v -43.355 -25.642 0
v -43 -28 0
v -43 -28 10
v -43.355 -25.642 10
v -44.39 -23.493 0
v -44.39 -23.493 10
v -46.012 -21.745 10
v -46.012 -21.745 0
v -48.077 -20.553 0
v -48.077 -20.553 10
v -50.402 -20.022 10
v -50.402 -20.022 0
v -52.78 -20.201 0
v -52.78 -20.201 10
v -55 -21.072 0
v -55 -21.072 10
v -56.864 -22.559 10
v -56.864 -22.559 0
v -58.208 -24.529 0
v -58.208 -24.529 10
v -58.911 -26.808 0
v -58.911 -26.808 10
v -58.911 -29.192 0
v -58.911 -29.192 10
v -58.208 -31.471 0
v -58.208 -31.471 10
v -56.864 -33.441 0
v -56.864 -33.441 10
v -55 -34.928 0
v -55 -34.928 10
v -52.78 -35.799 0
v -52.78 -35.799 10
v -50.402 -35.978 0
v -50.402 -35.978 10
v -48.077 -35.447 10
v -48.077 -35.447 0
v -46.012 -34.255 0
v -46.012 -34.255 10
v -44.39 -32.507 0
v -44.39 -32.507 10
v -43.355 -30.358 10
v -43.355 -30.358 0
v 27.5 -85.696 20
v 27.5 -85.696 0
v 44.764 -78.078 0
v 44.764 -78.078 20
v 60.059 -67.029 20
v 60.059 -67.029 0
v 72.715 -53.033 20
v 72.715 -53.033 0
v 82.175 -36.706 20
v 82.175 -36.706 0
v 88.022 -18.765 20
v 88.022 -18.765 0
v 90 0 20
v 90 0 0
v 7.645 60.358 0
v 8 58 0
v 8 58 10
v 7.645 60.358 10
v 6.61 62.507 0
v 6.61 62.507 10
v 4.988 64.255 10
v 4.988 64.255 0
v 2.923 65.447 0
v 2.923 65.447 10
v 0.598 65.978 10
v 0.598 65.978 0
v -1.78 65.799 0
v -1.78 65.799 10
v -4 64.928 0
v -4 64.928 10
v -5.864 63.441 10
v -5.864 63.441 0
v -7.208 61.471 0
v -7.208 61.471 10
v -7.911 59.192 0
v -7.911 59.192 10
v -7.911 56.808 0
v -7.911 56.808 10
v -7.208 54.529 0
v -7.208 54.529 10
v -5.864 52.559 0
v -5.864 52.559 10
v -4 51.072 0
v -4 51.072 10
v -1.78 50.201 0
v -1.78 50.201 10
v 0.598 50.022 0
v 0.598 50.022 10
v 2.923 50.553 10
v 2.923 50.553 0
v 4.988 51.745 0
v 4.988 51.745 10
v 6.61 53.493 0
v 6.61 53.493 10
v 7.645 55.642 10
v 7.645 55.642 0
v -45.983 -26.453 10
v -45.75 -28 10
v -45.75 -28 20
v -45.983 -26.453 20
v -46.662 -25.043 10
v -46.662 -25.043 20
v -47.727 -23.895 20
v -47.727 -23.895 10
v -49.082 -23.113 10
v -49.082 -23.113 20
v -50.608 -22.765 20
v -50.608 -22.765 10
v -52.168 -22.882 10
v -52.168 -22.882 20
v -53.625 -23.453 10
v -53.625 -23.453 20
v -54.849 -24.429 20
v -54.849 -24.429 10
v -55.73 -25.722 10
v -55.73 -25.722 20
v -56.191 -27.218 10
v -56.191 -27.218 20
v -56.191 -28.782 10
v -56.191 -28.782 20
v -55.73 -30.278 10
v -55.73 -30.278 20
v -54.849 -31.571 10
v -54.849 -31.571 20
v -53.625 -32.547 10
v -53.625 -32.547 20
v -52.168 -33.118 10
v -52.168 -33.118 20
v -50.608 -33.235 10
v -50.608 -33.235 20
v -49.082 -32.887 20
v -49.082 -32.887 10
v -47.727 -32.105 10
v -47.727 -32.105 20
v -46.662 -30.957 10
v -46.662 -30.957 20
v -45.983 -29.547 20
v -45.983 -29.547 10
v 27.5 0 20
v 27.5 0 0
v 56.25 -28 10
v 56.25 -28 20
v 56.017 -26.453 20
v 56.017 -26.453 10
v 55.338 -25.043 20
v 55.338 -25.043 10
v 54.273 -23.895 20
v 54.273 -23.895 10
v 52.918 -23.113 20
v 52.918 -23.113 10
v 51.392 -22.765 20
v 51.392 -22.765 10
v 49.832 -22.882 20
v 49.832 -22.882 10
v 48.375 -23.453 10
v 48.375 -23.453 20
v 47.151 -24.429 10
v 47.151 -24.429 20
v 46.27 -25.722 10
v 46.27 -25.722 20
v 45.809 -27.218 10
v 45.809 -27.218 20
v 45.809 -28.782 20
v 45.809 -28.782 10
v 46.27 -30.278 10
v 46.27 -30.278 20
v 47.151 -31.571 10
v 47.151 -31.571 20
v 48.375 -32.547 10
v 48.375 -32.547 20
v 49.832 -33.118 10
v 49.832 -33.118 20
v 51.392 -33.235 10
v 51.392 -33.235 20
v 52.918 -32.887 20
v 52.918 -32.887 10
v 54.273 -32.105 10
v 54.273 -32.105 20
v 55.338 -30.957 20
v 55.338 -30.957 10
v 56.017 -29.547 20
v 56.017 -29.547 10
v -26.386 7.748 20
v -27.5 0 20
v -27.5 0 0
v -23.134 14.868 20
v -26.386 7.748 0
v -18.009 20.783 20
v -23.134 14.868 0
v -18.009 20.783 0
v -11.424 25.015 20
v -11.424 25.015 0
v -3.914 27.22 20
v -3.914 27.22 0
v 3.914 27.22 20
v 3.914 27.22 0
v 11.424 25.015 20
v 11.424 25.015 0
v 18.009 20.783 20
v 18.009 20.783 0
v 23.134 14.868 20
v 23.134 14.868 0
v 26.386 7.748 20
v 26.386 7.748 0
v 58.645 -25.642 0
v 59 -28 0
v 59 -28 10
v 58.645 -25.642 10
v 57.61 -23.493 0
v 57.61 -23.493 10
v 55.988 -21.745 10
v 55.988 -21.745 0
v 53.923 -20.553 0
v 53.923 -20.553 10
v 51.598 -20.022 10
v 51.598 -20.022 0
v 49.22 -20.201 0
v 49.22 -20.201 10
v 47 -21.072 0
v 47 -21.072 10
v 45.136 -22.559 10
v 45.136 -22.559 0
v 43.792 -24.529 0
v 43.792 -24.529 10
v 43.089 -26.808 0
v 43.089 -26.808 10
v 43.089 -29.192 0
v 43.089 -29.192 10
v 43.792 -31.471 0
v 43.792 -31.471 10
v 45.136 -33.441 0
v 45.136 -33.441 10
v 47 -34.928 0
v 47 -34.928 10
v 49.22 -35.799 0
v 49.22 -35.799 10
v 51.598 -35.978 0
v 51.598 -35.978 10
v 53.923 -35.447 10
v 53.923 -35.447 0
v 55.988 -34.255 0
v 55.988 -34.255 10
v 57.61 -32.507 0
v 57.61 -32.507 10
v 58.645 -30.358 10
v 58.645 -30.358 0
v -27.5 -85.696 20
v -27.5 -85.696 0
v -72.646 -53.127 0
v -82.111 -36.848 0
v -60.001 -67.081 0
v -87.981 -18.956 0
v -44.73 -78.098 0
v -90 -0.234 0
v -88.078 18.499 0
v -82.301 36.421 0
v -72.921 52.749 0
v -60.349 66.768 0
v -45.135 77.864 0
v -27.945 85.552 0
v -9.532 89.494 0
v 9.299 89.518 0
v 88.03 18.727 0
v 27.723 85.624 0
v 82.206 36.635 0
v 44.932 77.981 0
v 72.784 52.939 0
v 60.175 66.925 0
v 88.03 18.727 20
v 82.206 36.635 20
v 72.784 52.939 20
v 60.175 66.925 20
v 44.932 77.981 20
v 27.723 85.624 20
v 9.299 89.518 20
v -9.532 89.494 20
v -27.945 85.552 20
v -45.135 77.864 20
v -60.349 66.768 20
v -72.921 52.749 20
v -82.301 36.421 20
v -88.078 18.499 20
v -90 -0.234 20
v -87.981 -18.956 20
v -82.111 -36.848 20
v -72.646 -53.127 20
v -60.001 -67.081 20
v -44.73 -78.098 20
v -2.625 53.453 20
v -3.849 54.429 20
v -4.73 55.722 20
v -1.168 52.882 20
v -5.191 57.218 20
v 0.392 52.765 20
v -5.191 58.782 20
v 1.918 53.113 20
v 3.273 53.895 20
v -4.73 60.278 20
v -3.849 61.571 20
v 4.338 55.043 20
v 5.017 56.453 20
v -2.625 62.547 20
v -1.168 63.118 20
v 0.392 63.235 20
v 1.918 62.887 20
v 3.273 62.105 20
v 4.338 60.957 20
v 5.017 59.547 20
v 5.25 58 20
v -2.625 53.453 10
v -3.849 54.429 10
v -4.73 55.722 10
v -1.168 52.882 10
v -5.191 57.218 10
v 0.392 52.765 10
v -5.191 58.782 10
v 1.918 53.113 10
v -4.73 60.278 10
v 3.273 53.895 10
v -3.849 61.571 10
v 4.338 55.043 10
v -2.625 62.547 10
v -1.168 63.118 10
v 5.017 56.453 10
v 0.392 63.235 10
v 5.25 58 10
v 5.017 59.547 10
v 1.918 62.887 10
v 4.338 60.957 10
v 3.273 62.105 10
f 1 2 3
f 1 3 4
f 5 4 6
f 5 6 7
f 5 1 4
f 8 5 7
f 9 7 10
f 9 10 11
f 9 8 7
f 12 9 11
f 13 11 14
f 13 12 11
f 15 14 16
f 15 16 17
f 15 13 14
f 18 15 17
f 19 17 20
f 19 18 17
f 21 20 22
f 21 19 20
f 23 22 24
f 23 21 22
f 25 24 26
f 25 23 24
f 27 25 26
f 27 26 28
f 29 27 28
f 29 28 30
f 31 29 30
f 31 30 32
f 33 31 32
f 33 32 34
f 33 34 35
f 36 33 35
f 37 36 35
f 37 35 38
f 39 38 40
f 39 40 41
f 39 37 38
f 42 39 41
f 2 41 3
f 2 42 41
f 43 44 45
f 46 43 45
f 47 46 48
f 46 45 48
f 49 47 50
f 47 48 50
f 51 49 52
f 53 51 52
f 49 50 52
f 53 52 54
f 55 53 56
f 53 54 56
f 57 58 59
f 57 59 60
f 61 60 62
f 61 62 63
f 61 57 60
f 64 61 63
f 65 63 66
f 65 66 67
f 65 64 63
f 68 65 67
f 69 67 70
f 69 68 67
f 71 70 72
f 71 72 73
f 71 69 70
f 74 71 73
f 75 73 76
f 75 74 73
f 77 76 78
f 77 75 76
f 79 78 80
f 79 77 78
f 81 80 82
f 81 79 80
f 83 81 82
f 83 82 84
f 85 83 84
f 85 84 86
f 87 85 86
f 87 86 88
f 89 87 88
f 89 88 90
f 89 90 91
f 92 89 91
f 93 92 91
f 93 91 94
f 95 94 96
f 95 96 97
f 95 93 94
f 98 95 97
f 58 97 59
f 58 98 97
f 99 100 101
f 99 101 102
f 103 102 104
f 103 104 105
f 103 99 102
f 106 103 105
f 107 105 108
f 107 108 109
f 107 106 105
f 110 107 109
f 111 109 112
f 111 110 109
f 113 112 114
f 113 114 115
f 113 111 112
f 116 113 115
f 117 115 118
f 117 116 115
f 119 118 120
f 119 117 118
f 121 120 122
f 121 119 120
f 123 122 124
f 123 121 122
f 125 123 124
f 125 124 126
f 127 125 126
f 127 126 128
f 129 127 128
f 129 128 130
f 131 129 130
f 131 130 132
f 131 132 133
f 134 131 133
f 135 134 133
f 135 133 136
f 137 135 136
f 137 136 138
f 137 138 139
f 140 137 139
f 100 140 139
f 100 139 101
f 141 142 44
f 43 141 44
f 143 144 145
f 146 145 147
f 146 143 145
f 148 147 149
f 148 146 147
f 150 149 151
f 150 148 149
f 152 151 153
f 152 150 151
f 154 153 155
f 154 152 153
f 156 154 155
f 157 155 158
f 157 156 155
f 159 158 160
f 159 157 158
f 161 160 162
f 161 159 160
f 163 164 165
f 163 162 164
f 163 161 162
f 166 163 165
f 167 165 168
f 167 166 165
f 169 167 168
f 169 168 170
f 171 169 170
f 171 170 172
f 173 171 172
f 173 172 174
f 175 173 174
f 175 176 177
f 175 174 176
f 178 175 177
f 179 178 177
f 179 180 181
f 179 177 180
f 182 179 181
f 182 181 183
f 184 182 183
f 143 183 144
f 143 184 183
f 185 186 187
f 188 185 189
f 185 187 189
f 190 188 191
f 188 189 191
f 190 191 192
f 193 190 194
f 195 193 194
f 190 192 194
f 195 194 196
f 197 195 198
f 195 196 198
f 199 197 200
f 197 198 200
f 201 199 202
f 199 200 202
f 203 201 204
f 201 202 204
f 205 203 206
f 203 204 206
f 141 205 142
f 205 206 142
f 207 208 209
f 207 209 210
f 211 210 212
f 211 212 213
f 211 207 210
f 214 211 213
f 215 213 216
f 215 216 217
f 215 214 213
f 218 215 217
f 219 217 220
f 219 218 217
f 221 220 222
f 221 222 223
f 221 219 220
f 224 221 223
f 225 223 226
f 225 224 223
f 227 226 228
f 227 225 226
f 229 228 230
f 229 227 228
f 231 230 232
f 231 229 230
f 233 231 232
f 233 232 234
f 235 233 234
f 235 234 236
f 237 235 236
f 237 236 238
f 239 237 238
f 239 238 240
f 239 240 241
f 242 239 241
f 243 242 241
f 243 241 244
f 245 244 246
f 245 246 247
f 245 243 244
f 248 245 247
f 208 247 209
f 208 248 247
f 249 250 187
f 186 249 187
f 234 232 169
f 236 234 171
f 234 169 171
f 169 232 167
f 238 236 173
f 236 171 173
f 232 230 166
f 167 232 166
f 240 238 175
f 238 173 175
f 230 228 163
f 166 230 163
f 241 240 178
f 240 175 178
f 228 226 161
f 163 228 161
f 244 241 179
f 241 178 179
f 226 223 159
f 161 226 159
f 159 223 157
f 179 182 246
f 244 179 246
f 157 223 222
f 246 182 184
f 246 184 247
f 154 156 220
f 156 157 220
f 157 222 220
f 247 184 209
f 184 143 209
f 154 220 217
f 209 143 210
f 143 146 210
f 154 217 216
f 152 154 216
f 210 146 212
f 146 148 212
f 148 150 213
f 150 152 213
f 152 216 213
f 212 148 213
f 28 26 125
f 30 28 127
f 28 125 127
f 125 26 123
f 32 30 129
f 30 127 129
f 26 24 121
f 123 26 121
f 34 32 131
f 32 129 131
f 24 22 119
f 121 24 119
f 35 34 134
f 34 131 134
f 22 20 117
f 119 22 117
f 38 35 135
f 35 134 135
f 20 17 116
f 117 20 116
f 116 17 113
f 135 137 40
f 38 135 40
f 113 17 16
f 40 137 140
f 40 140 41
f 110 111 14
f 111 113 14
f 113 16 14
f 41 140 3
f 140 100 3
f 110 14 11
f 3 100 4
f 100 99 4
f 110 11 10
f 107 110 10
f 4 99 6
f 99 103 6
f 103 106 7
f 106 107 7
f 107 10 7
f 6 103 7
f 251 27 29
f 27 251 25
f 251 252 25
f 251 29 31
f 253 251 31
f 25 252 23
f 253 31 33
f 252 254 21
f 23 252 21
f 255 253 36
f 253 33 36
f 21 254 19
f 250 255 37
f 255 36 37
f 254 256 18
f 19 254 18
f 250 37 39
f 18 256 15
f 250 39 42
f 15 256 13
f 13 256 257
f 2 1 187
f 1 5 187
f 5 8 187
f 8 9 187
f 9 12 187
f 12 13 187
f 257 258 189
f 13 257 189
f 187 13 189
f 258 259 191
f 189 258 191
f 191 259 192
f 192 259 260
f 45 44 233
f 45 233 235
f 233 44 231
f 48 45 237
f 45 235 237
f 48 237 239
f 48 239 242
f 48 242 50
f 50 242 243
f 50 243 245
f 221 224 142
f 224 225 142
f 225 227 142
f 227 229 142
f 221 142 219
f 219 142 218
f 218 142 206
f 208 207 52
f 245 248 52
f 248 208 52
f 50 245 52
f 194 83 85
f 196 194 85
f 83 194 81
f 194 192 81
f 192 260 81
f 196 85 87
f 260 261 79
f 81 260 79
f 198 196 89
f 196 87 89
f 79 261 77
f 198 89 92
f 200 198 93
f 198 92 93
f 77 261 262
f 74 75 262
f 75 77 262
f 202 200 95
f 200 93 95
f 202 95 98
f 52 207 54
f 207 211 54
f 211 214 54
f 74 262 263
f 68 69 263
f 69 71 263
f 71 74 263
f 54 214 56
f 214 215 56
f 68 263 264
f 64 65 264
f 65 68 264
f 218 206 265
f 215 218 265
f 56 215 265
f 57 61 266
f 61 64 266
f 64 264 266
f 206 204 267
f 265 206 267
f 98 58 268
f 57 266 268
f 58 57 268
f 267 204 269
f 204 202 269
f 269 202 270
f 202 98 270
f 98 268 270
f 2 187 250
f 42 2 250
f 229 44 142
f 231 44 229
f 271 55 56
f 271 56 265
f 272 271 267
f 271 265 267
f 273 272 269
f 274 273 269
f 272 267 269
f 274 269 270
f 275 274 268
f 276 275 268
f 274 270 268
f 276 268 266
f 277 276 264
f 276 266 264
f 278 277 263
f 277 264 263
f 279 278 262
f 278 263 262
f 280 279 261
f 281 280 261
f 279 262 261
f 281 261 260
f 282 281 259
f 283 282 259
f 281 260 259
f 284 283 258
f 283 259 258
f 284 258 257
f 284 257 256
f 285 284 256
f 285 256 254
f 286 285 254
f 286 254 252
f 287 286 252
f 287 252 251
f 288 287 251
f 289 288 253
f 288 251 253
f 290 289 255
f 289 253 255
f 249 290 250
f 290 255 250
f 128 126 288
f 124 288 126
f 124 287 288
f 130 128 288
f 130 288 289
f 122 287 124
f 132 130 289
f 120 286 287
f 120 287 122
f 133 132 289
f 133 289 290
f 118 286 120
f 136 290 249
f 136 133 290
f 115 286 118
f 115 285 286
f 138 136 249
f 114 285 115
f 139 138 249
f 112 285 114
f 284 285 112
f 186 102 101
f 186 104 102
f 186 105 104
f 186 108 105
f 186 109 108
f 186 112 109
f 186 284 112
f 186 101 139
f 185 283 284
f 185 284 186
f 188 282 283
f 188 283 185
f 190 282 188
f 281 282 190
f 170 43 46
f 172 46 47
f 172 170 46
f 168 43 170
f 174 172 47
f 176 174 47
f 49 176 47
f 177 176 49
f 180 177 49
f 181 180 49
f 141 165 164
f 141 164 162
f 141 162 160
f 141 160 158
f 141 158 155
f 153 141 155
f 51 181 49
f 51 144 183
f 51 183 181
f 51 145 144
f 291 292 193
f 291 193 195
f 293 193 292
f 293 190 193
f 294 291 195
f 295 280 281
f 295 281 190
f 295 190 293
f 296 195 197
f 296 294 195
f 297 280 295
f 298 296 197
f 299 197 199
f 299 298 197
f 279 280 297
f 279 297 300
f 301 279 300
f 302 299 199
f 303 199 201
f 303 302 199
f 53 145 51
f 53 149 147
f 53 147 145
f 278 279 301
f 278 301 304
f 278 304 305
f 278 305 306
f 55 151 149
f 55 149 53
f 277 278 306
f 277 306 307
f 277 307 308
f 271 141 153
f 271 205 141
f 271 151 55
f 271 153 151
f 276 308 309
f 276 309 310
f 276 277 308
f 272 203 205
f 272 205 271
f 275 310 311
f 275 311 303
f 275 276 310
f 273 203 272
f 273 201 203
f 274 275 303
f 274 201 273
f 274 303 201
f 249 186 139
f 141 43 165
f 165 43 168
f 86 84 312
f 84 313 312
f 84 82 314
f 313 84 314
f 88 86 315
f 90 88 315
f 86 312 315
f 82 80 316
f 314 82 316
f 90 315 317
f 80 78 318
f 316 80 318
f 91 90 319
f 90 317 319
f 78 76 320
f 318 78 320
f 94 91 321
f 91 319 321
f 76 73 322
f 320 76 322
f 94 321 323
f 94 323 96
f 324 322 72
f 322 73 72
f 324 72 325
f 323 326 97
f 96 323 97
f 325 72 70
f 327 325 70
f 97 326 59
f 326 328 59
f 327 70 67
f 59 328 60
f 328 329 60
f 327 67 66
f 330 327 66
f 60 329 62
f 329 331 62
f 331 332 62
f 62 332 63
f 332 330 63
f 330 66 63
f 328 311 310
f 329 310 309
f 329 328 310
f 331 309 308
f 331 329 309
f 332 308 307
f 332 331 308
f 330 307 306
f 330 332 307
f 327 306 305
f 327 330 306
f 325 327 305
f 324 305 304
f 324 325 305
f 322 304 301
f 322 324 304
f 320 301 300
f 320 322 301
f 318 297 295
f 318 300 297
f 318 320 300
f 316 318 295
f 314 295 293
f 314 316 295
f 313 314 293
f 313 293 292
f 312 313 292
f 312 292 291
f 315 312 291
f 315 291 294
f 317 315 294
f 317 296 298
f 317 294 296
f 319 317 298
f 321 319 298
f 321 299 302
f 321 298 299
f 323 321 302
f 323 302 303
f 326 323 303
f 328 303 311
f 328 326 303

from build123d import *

# Parameters (mm, degrees)
F0_R     = 8
F0_R_2   = 5.25
F1_DEPTH = 20
F2_DEPTH = 20.001
F3_DEPTH = 10


with BuildPart() as f1:
    # F0 (on Top) → F1 (new body)
    with BuildSketch(Plane.XY):
        with BuildLine():
            ThreePointArc((27.5, -85.695683), (72.715198, -53.033009), (90, 0))
            ThreePointArc((90, 0), (-53.033009, 72.715198), (-27.5, -85.695683))
            Line((-27.5, -85.695683), (-27.5, 0))
            ThreePointArc((-27.5, 0), (0, 27.5), (27.5, 0))
            Line((27.5, 0), (27.5, -85.695683))
        make_face()
        with Locations((-51, -28)):
            Circle(F0_R, mode=Mode.SUBTRACT)
        with Locations((51, -28)):
            Circle(F0_R, mode=Mode.SUBTRACT)
        with Locations((0, 58)):
            Circle(F0_R, mode=Mode.SUBTRACT)
        with Locations((-51, -28)):
            Circle(F0_R_2)
        with Locations((-51, -28)):
            Circle(F0_R)
        with Locations((-51, -28)):
            Circle(F0_R_2, mode=Mode.SUBTRACT)
        with Locations((51, -28)):
            Circle(F0_R)
        with Locations((51, -28)):
            Circle(F0_R_2, mode=Mode.SUBTRACT)
        with Locations((51, -28)):
            Circle(F0_R_2)
        with Locations((0, 58)):
            Circle(F0_R)
        with Locations((0, 58)):
            Circle(F0_R_2, mode=Mode.SUBTRACT)
        with Locations((0, 58)):
            Circle(F0_R_2)
    extrude(amount=F1_DEPTH)

    # F0 (on Top) → F2 (cut, through all)
    with BuildSketch(Plane.XY):
        with Locations((0, 58)):
            Circle(F0_R_2)
        with Locations((-51, -28)):
            Circle(F0_R_2)
        with Locations((51, -28)):
            Circle(F0_R_2)
    extrude(amount=F2_DEPTH, mode=Mode.SUBTRACT)

    # F0 (on Top) → F3 (cut)
    with BuildSketch(Plane.XY):
        with Locations((0, 58)):
            Circle(F0_R)
        with Locations((0, 58)):
            Circle(F0_R_2, mode=Mode.SUBTRACT)
        with Locations((51, -28)):
            Circle(F0_R)
        with Locations((51, -28)):
            Circle(F0_R_2, mode=Mode.SUBTRACT)
        with Locations((-51, -28)):
            Circle(F0_R)
        with Locations((-51, -28)):
            Circle(F0_R_2, mode=Mode.SUBTRACT)
    extrude(amount=F3_DEPTH, mode=Mode.SUBTRACT)


solid = f1.part
